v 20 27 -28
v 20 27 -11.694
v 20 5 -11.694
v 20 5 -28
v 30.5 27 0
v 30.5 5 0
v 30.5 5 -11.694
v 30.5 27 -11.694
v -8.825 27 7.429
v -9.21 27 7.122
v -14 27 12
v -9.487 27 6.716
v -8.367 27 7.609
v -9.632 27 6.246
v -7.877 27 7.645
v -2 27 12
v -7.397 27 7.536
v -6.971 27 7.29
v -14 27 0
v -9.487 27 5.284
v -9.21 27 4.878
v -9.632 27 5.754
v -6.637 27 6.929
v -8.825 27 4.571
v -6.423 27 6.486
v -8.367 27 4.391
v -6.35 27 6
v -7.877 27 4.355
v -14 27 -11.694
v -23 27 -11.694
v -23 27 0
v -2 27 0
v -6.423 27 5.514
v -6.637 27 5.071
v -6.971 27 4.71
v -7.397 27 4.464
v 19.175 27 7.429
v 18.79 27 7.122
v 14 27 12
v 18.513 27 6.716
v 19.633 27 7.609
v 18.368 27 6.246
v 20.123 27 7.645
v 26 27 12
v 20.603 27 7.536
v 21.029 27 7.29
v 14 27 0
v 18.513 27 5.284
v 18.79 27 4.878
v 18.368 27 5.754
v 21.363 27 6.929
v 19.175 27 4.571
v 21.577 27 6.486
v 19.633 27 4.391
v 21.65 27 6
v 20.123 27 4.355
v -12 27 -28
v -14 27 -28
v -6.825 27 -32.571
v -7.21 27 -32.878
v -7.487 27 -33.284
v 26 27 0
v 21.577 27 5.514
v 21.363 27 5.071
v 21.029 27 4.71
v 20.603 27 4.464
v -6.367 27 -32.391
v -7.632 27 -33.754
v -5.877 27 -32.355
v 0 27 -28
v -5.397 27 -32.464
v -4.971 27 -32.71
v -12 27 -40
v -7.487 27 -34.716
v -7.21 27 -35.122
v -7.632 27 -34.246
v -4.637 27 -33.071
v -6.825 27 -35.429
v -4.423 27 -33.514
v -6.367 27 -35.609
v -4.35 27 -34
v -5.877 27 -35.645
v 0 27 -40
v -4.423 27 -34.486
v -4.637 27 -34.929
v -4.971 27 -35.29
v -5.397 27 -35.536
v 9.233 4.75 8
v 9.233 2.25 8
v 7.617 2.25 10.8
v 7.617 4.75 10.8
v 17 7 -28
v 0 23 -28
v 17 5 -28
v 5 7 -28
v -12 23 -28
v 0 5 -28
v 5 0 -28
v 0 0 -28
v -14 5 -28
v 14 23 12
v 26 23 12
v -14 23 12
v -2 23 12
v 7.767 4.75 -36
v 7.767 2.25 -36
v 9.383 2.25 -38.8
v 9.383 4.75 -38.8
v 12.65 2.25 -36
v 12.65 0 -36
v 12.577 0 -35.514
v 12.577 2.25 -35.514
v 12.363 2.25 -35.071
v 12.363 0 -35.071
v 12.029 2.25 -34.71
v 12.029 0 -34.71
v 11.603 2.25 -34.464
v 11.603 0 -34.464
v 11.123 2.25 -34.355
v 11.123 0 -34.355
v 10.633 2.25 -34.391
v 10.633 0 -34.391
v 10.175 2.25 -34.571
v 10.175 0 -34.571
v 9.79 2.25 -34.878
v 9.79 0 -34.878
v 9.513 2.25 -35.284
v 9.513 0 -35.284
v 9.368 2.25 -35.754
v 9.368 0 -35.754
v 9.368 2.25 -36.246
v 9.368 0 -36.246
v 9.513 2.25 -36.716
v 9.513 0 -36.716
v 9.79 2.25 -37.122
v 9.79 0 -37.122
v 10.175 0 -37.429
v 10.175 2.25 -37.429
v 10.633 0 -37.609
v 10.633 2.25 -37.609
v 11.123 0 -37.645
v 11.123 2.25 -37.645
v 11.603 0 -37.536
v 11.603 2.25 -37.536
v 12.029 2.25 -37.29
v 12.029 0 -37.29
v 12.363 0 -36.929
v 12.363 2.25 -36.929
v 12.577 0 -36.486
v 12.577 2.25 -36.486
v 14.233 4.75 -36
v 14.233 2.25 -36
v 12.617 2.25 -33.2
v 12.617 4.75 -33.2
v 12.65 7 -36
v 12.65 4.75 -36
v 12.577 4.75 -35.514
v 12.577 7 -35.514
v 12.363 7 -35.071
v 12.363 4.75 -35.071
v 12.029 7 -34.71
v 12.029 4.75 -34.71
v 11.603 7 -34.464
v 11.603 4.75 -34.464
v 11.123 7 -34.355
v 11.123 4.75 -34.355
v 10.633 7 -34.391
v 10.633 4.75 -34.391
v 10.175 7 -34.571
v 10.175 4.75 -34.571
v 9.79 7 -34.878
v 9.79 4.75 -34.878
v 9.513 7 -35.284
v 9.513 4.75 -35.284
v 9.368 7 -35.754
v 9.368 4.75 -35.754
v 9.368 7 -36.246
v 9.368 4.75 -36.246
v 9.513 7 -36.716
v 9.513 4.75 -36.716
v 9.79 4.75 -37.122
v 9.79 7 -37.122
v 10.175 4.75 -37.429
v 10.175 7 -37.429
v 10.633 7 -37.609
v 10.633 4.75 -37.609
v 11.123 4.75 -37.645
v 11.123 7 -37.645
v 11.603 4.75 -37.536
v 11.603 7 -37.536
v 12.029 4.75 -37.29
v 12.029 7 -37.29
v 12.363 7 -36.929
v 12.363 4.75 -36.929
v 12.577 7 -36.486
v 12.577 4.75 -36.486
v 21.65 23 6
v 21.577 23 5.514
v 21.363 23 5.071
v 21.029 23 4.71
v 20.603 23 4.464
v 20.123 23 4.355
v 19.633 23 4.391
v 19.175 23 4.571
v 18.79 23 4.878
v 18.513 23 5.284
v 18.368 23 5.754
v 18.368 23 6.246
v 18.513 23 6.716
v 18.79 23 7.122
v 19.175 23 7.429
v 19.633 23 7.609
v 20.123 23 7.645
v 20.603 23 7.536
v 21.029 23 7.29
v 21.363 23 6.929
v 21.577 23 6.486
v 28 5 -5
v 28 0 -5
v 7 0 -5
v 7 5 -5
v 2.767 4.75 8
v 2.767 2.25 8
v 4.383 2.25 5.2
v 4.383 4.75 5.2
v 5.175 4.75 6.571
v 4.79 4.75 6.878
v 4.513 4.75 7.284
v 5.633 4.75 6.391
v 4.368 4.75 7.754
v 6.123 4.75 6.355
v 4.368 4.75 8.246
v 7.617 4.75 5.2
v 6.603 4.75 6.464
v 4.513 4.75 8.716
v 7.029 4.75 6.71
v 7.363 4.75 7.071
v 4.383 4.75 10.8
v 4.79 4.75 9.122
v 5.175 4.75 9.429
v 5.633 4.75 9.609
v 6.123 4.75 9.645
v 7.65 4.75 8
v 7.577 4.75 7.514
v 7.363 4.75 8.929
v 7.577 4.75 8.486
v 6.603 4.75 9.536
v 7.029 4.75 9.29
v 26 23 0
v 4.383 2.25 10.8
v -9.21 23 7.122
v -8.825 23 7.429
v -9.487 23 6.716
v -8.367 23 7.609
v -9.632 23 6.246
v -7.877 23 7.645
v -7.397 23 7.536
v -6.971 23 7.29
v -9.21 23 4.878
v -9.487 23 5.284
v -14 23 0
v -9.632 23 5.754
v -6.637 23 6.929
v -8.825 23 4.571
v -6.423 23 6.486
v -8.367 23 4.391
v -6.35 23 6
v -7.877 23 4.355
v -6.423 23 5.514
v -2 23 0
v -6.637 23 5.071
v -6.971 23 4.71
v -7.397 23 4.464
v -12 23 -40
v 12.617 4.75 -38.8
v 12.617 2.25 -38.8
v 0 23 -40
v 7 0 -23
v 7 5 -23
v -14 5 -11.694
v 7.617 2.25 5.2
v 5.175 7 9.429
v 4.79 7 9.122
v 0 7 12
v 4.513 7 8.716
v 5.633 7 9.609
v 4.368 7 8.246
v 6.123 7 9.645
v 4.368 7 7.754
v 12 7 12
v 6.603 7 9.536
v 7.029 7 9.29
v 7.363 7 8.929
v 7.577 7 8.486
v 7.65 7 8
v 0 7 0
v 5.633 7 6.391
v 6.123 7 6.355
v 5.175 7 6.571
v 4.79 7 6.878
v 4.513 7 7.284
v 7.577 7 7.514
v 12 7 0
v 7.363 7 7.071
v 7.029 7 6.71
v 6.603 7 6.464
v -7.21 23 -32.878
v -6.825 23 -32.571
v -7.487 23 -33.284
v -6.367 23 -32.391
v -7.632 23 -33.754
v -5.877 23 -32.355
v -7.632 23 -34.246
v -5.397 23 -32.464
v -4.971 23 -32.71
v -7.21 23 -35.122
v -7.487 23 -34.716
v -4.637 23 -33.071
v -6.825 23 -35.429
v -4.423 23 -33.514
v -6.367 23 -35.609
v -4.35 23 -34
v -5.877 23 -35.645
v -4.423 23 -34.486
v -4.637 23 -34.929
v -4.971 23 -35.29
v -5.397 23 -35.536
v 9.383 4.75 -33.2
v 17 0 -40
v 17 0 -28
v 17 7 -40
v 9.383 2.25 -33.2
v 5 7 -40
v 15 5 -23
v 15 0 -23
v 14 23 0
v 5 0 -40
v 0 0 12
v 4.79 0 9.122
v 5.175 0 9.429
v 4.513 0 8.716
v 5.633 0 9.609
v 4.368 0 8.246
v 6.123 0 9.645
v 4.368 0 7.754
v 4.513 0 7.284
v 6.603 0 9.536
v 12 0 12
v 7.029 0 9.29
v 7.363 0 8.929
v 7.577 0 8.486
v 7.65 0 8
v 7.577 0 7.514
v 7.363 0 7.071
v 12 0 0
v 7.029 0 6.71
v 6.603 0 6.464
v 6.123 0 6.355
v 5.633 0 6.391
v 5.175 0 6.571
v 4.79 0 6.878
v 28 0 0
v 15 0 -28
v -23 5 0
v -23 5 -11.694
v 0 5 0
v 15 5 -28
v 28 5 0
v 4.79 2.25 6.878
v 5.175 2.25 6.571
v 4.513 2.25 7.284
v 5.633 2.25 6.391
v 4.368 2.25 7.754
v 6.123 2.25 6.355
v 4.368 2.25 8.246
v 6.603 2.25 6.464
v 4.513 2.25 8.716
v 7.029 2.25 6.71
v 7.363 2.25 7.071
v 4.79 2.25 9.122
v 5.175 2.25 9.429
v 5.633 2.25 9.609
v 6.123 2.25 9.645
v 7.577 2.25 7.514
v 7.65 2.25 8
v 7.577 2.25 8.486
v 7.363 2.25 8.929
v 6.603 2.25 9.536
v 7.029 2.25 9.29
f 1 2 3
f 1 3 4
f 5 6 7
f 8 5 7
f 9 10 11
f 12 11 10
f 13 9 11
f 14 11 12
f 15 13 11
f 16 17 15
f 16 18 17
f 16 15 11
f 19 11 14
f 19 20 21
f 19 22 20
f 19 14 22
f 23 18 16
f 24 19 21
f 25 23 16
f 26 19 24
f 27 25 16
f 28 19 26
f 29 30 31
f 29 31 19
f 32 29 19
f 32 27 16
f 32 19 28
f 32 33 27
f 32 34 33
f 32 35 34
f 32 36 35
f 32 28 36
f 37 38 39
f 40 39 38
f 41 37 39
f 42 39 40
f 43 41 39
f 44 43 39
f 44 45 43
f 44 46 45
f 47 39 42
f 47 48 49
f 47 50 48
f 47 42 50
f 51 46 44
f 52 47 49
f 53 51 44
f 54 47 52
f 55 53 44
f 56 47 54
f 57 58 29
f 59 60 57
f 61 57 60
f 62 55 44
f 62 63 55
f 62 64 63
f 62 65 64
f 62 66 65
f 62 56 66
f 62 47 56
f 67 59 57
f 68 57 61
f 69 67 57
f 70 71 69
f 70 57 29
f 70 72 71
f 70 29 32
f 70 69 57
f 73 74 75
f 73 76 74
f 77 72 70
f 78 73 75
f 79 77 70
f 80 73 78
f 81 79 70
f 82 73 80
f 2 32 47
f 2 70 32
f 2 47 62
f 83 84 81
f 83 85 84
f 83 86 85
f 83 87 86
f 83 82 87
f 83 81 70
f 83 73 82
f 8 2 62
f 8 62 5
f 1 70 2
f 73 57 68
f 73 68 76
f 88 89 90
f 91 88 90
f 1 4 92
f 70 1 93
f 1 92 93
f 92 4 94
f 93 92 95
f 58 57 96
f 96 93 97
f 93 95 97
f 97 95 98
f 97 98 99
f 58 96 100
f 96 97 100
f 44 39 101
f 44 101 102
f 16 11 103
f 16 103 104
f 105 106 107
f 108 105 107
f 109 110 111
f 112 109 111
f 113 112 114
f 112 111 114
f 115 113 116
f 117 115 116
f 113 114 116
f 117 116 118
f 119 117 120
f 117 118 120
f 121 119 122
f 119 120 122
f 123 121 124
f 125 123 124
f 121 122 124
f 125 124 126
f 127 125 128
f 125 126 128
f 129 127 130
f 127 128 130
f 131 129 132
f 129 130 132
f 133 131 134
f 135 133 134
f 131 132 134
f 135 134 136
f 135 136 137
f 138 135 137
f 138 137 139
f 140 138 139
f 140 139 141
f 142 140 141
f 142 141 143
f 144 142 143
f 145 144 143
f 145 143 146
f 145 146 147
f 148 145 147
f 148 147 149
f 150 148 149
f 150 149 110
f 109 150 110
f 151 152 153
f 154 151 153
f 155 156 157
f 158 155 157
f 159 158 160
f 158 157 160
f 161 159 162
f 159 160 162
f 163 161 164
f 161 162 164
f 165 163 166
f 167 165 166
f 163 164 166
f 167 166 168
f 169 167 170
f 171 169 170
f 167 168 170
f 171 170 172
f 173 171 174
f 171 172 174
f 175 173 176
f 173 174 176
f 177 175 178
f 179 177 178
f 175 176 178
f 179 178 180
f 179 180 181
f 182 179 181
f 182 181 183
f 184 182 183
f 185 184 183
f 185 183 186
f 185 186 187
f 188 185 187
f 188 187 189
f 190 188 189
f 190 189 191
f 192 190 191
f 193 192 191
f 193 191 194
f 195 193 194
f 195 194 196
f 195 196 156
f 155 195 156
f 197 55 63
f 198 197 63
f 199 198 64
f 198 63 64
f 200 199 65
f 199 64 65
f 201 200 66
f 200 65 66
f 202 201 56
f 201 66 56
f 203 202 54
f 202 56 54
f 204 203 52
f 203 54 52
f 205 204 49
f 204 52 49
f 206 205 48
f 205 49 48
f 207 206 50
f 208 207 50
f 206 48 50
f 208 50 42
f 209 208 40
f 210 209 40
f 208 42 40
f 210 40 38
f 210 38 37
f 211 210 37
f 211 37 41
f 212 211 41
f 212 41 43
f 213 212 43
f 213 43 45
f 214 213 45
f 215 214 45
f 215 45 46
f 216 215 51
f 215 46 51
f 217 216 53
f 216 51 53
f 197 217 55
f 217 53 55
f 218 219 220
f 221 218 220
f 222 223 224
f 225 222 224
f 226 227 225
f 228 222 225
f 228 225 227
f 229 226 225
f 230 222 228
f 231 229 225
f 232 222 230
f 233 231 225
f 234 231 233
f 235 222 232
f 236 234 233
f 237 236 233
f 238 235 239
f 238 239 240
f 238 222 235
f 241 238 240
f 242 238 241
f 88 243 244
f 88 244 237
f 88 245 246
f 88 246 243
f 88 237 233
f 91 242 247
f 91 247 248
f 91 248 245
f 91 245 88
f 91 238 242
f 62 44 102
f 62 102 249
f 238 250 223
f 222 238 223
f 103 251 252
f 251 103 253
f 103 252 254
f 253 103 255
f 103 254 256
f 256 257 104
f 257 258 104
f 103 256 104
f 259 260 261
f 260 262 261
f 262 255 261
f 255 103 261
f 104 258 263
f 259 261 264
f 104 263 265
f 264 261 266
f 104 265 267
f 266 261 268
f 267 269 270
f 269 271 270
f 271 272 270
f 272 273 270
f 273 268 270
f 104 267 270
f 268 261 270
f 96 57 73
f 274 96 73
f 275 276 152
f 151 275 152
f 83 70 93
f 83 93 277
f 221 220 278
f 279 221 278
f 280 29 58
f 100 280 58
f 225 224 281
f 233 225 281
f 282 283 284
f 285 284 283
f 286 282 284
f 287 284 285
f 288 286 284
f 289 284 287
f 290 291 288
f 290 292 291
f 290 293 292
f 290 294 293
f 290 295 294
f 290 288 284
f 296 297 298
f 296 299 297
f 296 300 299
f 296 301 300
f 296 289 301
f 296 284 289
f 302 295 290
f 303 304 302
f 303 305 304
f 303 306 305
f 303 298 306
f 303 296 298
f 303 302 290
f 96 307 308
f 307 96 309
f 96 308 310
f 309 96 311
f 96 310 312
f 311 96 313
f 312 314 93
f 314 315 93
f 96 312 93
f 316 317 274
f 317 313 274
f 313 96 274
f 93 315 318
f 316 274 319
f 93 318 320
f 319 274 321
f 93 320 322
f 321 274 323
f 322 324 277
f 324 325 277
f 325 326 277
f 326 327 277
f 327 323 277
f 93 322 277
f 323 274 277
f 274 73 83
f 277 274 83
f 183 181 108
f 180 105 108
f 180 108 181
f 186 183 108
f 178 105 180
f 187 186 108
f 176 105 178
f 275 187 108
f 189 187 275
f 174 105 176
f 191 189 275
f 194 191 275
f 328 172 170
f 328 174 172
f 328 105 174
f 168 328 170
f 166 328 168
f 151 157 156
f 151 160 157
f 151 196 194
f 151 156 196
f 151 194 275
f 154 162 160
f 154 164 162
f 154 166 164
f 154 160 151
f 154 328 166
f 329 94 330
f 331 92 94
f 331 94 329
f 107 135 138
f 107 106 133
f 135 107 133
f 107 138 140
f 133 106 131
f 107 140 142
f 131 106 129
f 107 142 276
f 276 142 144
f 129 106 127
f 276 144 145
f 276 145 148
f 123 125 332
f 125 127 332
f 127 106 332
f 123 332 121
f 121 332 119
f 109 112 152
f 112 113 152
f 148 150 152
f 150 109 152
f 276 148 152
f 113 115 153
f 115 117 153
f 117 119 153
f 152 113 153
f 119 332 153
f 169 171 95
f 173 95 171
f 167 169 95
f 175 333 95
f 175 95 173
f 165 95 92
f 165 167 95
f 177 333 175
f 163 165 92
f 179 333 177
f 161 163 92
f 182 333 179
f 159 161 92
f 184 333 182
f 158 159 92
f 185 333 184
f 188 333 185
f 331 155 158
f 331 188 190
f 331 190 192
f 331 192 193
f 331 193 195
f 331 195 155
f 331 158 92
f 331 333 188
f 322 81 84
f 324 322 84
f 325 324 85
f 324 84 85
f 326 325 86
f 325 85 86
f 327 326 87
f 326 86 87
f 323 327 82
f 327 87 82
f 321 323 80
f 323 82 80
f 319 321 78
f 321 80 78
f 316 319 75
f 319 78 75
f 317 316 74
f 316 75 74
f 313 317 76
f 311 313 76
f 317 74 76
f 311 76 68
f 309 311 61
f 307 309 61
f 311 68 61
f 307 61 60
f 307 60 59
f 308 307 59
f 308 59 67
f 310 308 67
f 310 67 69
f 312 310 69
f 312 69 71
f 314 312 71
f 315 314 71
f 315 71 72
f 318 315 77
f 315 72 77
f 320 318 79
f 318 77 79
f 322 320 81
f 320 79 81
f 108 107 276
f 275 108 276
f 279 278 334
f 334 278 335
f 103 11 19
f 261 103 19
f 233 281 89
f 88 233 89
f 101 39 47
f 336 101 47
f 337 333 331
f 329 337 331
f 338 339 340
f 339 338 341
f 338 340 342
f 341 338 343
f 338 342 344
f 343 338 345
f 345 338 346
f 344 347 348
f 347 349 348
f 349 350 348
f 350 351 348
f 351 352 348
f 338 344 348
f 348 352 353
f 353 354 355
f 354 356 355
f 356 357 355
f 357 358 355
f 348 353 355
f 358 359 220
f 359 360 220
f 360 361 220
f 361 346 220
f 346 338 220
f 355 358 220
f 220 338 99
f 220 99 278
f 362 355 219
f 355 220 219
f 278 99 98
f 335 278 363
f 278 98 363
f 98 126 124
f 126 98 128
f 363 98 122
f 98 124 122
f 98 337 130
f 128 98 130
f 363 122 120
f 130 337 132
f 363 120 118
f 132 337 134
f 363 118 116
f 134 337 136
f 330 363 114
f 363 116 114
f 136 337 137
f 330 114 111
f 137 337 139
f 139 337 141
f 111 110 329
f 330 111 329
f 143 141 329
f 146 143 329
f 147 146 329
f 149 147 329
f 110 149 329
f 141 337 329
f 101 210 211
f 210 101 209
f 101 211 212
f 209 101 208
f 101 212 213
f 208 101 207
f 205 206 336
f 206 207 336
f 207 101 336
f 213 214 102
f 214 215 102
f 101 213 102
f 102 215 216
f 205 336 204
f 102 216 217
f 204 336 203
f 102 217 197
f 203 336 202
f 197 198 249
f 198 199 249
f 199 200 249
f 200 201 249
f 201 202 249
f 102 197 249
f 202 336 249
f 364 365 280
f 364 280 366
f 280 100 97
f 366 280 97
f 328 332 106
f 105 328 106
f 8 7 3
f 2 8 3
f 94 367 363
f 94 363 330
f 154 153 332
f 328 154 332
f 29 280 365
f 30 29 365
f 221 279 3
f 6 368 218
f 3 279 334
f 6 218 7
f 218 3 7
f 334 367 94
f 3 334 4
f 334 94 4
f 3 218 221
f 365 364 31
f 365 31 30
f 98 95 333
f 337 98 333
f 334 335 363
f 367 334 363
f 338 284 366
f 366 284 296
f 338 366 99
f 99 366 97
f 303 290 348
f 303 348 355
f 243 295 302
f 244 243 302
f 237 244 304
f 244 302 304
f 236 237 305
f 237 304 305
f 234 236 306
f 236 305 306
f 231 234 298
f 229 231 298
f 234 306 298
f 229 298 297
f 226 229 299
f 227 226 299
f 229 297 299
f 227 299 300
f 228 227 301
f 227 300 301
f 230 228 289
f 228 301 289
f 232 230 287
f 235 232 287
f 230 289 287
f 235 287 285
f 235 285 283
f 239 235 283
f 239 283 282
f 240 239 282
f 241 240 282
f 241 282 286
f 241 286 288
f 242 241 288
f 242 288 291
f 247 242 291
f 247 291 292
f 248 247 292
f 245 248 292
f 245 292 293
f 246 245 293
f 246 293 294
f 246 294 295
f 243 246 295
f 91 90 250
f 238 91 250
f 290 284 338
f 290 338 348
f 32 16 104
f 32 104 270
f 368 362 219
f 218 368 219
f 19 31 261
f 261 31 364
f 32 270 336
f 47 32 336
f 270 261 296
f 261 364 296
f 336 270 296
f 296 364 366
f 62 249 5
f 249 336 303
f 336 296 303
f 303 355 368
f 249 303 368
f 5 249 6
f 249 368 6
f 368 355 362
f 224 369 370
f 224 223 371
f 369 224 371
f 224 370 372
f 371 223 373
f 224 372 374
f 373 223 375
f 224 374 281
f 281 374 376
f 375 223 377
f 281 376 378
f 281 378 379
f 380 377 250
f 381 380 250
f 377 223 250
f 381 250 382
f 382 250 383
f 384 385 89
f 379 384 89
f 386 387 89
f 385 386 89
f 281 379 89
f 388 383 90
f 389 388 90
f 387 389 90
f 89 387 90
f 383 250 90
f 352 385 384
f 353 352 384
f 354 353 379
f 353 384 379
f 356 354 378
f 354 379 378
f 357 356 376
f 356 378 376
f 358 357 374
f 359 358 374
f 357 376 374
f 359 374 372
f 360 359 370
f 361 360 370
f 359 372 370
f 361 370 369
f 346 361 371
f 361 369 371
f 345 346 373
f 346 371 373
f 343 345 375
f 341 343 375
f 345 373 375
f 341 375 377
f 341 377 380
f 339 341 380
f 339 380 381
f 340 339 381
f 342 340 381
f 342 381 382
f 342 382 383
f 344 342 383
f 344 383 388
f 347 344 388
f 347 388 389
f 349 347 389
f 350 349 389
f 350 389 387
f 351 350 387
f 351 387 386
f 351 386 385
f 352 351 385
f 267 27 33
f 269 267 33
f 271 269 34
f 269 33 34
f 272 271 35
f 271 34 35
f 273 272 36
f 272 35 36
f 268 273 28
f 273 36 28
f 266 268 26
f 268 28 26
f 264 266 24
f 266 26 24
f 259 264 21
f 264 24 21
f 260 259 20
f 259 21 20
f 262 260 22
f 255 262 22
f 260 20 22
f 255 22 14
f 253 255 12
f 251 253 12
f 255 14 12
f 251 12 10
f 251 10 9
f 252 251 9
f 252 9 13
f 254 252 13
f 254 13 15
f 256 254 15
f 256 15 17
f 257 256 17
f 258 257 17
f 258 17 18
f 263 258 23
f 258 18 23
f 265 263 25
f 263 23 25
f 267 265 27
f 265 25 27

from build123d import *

# Parameters (mm, degrees)
BOSS_EXTRUDE1_DEPTH = 5
SKETCH2_W           = 14
SKETCH2_H           = 11.693793348
SKETCH2_W_2         = 9
SKETCH2_H_2         = 16.306206652
SKETCH2_W_3         = 13
SKETCH2_H_3         = 6.693793348
SKETCH2_W_4         = 8
SKETCH2_H_4         = 5
BOSS_EXTRUDE2_DEPTH = 22
BOSS_EXTRUDE3_START = -20
SKETCH3_W           = 12
SKETCH3_H           = 12
BOSS_EXTRUDE3_DEPTH = 7
CUT_EXTRUDE1_START  = -2.25
CUT_EXTRUDE1_DEPTH  = 2.5
SKETCH5_R           = 1.65
CUT_EXTRUDE3_DEPTH  = 28
SKETCH6_W           = 12
SKETCH6_H           = 12
SKETCH6_R           = 1.65
BOSS_EXTRUDE4_DEPTH = 4
BOSS_EXTRUDE6_START = -20
SKETCH7_W           = 12
SKETCH7_H           = 12
SKETCH7_R           = 1.65
BOSS_EXTRUDE6_DEPTH = 7
CUT_EXTRUDE4_START  = -2.25
CUT_EXTRUDE4_DEPTH  = 2.5
SKETCH9_W           = 12
SKETCH9_H           = 12
SKETCH9_R           = 1.65
BOSS_EXTRUDE7_DEPTH = 4


with BuildPart() as part:
    # Sketch1 → Boss-Extrude1 (new body)
    with BuildSketch(Plane(origin=(0, 0, 0), x_dir=(1, 0, 0), z_dir=(0, 1, 0))):
        Polygon((0, 0), (28, 0), (28, 5), (7, 5), (7, 23), (15, 23), (15, 28), (0, 28), align=None)
    extrude(amount=BOSS_EXTRUDE1_DEPTH)

    # Sketch2 → Boss-Extrude2 (add)
    with BuildSketch(Plane(origin=(0, 5, 0), x_dir=(1, 0, 0), z_dir=(0, 1, 0))):
        with Locations((-7, 5.846896674)):
            Rectangle(SKETCH2_W, SKETCH2_H)
        with Locations((-18.5, 5.846896674)):
            Rectangle(SKETCH2_W_2, SKETCH2_H)
        with Locations((-7, 19.846896674)):
            Rectangle(SKETCH2_W, SKETCH2_H_2)
        Polygon((7, 23), (7, 11.693793348), (20, 11.693793348), (20, 28), (15, 28), (15, 23), align=None)
        with Locations((13.5, 8.346896674)):
            Rectangle(SKETCH2_W_3, SKETCH2_H_3)
        Polygon((20, 11.693793348), (20, 5), (28, 5), (28, 0), (30.5, 0), (30.5, 11.693793348), align=None)
        Polygon((0, 11.693793348), (0, 0), (20, 0), (20, 5), (7, 5), (7, 11.693793348), align=None)
        Polygon((0, 28), (0, 11.693793348), (7, 11.693793348), (7, 23), (15, 23), (15, 28), align=None)
        with Locations((24, 2.5)):
            Rectangle(SKETCH2_W_4, SKETCH2_H_4)
    extrude(amount=BOSS_EXTRUDE2_DEPTH)

    # Sketch3 → Boss-Extrude3 (add)
    with BuildSketch(Plane(origin=(0, 27, 0), x_dir=(1, 0, 0), z_dir=(0, 1, 0)).offset(BOSS_EXTRUDE3_START)):
        with Locations((11, 34)):
            Rectangle(SKETCH3_W, SKETCH3_H)
    extrude(amount=-BOSS_EXTRUDE3_DEPTH)

    # Sketch4 → Cut-Extrude1 (cut)
    with BuildSketch(Plane.XZ.offset(CUT_EXTRUDE1_START)):
        Polygon((14.233161507, -36), (12.616580754, -33.2), (9.383419246, -33.2), (7.766838493, -36), (9.383419246, -38.8), (12.616580754, -38.8), align=None)
    extrude(amount=-CUT_EXTRUDE1_DEPTH, mode=Mode.SUBTRACT)

    # Sketch5 → Cut-Extrude3 (cut, through all)
    with BuildSketch(Plane.XZ):
        with Locations((11, -36)):
            Circle(SKETCH5_R)
    extrude(amount=-CUT_EXTRUDE3_DEPTH, mode=Mode.SUBTRACT)

    # Sketch6 → Boss-Extrude4 (add)
    with BuildSketch(Plane(origin=(0, 27, 0), x_dir=(1, 0, 0), z_dir=(0, 1, 0))):
        with Locations((-6, 34)):
            Rectangle(SKETCH6_W, SKETCH6_H)
        with Locations((-6, 34)):
            Circle(SKETCH6_R, mode=Mode.SUBTRACT)
    extrude(amount=-BOSS_EXTRUDE4_DEPTH)

    # Sketch7 → Boss-Extrude6 (add)
    with BuildSketch(Plane(origin=(0, 27, 0), x_dir=(1, 0, 0), z_dir=(0, 1, 0)).offset(BOSS_EXTRUDE6_START)):
        with Locations((6, -6)):
            Rectangle(SKETCH7_W, SKETCH7_H)
        with Locations((6, -8)):
            Circle(SKETCH7_R, mode=Mode.SUBTRACT)
    extrude(amount=-BOSS_EXTRUDE6_DEPTH)

    # Sketch8 → Cut-Extrude4 (cut)
    with BuildSketch(Plane.XZ.offset(CUT_EXTRUDE4_START)):
        Polygon((9.233161507, 8), (7.616580754, 10.8), (4.383419246, 10.8), (2.766838493, 8), (4.383419246, 5.2), (7.616580754, 5.2), align=None)
    extrude(amount=-CUT_EXTRUDE4_DEPTH, mode=Mode.SUBTRACT)

    # Sketch9 → Boss-Extrude7 (add)
    with BuildSketch(Plane(origin=(0, 27, 0), x_dir=(1, 0, 0), z_dir=(0, 1, 0))):
        with Locations((-8, -6)):
            Rectangle(SKETCH9_W, SKETCH9_H)
        with Locations((-8, -6)):
            Circle(SKETCH9_R, mode=Mode.SUBTRACT)
        with Locations((20, -6)):
            Rectangle(SKETCH9_W, SKETCH9_H)
        with Locations((20, -6)):
            Circle(SKETCH9_R, mode=Mode.SUBTRACT)
    extrude(amount=-BOSS_EXTRUDE7_DEPTH)


solid = part.part
